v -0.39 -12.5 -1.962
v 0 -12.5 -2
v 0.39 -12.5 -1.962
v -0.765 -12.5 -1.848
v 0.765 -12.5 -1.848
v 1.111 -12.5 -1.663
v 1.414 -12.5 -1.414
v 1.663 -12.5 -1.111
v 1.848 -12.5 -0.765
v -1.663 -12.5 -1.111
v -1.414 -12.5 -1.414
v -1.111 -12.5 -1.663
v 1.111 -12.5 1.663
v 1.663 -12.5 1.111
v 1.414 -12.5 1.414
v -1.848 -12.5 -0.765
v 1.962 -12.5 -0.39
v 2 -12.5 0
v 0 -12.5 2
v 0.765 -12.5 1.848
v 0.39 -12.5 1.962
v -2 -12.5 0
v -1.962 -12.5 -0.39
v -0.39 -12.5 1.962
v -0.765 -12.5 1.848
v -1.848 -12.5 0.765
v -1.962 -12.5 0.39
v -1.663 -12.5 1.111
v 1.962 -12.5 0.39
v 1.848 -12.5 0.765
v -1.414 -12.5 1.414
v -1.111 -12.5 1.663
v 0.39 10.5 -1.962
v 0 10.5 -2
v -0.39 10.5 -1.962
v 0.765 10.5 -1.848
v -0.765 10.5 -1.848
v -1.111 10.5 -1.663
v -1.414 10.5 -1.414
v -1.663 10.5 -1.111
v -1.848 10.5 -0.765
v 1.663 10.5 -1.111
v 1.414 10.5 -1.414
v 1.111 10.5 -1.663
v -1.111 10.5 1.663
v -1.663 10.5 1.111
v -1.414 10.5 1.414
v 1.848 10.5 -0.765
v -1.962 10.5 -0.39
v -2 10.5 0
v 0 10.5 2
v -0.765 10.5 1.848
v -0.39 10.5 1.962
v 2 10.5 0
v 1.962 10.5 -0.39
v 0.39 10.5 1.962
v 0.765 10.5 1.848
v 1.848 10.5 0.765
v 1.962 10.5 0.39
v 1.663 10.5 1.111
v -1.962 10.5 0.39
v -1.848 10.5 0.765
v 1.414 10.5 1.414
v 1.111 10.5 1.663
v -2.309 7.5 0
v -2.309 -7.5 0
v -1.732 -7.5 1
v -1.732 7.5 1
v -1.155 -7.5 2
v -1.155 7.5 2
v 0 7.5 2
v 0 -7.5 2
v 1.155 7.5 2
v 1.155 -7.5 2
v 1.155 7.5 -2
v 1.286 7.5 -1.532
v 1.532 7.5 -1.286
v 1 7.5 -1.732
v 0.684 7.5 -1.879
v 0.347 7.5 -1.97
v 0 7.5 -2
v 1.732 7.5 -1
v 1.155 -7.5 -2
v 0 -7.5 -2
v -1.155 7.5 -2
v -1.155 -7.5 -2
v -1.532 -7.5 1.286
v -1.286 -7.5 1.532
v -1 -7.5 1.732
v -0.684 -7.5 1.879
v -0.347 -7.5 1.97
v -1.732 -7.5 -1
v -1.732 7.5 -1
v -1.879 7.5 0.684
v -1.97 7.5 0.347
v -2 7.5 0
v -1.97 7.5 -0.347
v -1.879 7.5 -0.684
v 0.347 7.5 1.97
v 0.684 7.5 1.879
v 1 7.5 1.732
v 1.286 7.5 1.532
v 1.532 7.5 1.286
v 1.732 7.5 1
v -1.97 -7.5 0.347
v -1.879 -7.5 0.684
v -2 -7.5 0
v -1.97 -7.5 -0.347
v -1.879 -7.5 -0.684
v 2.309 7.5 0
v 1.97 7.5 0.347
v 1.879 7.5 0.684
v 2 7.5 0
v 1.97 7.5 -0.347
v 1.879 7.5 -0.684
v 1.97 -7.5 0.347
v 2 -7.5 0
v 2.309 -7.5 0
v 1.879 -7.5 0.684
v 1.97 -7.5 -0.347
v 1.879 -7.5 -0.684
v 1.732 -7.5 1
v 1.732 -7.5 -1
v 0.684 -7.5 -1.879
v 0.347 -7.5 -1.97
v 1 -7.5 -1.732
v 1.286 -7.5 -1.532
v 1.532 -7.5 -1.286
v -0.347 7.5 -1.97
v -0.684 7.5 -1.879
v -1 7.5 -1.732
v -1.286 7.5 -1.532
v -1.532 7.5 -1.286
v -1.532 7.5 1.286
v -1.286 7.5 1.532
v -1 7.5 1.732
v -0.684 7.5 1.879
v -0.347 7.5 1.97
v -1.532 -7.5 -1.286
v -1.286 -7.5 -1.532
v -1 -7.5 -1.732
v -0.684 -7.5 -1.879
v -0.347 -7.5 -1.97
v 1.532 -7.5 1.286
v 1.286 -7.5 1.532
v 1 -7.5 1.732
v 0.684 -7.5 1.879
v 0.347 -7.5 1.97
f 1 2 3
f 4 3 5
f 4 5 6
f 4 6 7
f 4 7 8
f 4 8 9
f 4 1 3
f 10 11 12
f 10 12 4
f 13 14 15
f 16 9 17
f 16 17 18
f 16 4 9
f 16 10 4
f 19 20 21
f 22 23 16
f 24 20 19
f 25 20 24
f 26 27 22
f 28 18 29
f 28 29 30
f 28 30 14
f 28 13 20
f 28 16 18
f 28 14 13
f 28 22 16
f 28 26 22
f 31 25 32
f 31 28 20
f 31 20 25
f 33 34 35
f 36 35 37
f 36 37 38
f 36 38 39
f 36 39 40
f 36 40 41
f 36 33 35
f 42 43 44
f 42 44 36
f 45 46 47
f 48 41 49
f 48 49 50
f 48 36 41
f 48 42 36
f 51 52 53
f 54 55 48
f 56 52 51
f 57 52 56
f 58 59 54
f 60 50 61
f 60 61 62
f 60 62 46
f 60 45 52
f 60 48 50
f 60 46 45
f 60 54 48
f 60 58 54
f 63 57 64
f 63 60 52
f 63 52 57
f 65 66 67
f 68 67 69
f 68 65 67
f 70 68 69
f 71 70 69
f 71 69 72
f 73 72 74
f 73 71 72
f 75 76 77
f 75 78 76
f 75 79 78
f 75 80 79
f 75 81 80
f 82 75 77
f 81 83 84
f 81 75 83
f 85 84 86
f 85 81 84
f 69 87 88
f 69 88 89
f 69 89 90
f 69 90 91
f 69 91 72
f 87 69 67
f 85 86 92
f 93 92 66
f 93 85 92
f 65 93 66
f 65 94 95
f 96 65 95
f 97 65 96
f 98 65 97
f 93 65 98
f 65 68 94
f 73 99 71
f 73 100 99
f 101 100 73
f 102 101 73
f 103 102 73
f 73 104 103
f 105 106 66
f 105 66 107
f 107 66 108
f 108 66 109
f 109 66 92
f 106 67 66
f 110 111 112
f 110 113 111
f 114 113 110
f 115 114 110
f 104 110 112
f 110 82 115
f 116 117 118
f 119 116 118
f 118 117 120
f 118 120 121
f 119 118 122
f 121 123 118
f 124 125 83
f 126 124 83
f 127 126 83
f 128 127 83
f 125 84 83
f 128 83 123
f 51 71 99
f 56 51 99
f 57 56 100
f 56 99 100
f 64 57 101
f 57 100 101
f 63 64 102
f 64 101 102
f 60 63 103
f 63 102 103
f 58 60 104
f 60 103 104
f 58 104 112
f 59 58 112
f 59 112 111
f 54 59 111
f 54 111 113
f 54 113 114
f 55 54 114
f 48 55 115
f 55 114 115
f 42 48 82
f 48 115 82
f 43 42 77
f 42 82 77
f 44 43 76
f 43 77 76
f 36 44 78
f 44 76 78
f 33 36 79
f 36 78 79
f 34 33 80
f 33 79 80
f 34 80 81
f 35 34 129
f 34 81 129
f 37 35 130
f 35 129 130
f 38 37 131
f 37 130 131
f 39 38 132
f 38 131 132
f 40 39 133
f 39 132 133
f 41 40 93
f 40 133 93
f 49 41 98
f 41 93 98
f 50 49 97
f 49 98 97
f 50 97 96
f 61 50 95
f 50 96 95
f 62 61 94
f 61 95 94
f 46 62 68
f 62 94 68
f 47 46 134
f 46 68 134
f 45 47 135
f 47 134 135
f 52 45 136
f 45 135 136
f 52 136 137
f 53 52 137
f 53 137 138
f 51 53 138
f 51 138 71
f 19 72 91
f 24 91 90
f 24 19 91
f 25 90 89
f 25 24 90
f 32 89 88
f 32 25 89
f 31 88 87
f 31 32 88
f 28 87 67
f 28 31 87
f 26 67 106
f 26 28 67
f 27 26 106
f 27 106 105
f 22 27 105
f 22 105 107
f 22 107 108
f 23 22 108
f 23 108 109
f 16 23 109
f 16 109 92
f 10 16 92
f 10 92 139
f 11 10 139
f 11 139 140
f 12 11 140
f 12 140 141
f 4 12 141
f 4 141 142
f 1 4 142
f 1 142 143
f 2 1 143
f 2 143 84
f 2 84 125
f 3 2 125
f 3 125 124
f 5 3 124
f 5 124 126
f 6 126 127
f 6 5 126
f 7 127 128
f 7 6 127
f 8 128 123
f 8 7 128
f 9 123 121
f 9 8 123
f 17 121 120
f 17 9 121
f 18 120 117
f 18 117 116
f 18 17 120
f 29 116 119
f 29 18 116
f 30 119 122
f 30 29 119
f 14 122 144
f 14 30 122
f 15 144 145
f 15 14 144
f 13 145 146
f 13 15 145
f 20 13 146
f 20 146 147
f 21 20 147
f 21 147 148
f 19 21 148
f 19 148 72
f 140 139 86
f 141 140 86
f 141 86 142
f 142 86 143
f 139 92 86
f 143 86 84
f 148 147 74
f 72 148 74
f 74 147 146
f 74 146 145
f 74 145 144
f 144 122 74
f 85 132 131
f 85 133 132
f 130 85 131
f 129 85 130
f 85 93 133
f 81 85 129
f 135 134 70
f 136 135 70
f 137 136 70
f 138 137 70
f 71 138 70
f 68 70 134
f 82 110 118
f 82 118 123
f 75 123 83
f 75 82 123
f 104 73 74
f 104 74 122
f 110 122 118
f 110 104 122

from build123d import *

# Parameters (mm, degrees)
BOSS_EXTRUDE1_DEPTH = 7.5
SKETCH2_R           = 2
BOSS_EXTRUDE3_DEPTH = 3
BOSS_EXTRUDE4_START = 5
SKETCH4_R           = 2
BOSS_EXTRUDE4_DEPTH = 5


with BuildPart() as part:
    # Sketch1 → Boss-Extrude1 (new, symmetric)
    with BuildSketch(Plane(origin=(0, 0, 0), x_dir=(1, 0, 0), z_dir=(0, 1, 0))):
        Polygon((-2.309401077, 0), (-1.154700538, -2), (1.154700538, -2), (2.309401077, 0), (1.154700538, 2), (-1.154700538, 2), align=None)
    extrude(amount=BOSS_EXTRUDE1_DEPTH, both=True)

    # Sketch2 → Boss-Extrude3 (add)
    with BuildSketch(Plane(origin=(0, 7.5, 0), x_dir=(1, 0, 0), z_dir=(0, 1, 0))):
        with Locations(Location((0, 0, 0), (0, 0, 270))):
            Circle(SKETCH2_R)
    extrude(amount=BOSS_EXTRUDE3_DEPTH)

    # Sketch4 → Boss-Extrude4 (add)
    with BuildSketch(Plane.XZ.offset(7.5).offset(BOSS_EXTRUDE4_START)):
        with Locations(Location((0, 0, 0), (0, 0, 90))):
            Circle(SKETCH4_R)
    extrude(amount=-BOSS_EXTRUDE4_DEPTH)


solid = part.part
